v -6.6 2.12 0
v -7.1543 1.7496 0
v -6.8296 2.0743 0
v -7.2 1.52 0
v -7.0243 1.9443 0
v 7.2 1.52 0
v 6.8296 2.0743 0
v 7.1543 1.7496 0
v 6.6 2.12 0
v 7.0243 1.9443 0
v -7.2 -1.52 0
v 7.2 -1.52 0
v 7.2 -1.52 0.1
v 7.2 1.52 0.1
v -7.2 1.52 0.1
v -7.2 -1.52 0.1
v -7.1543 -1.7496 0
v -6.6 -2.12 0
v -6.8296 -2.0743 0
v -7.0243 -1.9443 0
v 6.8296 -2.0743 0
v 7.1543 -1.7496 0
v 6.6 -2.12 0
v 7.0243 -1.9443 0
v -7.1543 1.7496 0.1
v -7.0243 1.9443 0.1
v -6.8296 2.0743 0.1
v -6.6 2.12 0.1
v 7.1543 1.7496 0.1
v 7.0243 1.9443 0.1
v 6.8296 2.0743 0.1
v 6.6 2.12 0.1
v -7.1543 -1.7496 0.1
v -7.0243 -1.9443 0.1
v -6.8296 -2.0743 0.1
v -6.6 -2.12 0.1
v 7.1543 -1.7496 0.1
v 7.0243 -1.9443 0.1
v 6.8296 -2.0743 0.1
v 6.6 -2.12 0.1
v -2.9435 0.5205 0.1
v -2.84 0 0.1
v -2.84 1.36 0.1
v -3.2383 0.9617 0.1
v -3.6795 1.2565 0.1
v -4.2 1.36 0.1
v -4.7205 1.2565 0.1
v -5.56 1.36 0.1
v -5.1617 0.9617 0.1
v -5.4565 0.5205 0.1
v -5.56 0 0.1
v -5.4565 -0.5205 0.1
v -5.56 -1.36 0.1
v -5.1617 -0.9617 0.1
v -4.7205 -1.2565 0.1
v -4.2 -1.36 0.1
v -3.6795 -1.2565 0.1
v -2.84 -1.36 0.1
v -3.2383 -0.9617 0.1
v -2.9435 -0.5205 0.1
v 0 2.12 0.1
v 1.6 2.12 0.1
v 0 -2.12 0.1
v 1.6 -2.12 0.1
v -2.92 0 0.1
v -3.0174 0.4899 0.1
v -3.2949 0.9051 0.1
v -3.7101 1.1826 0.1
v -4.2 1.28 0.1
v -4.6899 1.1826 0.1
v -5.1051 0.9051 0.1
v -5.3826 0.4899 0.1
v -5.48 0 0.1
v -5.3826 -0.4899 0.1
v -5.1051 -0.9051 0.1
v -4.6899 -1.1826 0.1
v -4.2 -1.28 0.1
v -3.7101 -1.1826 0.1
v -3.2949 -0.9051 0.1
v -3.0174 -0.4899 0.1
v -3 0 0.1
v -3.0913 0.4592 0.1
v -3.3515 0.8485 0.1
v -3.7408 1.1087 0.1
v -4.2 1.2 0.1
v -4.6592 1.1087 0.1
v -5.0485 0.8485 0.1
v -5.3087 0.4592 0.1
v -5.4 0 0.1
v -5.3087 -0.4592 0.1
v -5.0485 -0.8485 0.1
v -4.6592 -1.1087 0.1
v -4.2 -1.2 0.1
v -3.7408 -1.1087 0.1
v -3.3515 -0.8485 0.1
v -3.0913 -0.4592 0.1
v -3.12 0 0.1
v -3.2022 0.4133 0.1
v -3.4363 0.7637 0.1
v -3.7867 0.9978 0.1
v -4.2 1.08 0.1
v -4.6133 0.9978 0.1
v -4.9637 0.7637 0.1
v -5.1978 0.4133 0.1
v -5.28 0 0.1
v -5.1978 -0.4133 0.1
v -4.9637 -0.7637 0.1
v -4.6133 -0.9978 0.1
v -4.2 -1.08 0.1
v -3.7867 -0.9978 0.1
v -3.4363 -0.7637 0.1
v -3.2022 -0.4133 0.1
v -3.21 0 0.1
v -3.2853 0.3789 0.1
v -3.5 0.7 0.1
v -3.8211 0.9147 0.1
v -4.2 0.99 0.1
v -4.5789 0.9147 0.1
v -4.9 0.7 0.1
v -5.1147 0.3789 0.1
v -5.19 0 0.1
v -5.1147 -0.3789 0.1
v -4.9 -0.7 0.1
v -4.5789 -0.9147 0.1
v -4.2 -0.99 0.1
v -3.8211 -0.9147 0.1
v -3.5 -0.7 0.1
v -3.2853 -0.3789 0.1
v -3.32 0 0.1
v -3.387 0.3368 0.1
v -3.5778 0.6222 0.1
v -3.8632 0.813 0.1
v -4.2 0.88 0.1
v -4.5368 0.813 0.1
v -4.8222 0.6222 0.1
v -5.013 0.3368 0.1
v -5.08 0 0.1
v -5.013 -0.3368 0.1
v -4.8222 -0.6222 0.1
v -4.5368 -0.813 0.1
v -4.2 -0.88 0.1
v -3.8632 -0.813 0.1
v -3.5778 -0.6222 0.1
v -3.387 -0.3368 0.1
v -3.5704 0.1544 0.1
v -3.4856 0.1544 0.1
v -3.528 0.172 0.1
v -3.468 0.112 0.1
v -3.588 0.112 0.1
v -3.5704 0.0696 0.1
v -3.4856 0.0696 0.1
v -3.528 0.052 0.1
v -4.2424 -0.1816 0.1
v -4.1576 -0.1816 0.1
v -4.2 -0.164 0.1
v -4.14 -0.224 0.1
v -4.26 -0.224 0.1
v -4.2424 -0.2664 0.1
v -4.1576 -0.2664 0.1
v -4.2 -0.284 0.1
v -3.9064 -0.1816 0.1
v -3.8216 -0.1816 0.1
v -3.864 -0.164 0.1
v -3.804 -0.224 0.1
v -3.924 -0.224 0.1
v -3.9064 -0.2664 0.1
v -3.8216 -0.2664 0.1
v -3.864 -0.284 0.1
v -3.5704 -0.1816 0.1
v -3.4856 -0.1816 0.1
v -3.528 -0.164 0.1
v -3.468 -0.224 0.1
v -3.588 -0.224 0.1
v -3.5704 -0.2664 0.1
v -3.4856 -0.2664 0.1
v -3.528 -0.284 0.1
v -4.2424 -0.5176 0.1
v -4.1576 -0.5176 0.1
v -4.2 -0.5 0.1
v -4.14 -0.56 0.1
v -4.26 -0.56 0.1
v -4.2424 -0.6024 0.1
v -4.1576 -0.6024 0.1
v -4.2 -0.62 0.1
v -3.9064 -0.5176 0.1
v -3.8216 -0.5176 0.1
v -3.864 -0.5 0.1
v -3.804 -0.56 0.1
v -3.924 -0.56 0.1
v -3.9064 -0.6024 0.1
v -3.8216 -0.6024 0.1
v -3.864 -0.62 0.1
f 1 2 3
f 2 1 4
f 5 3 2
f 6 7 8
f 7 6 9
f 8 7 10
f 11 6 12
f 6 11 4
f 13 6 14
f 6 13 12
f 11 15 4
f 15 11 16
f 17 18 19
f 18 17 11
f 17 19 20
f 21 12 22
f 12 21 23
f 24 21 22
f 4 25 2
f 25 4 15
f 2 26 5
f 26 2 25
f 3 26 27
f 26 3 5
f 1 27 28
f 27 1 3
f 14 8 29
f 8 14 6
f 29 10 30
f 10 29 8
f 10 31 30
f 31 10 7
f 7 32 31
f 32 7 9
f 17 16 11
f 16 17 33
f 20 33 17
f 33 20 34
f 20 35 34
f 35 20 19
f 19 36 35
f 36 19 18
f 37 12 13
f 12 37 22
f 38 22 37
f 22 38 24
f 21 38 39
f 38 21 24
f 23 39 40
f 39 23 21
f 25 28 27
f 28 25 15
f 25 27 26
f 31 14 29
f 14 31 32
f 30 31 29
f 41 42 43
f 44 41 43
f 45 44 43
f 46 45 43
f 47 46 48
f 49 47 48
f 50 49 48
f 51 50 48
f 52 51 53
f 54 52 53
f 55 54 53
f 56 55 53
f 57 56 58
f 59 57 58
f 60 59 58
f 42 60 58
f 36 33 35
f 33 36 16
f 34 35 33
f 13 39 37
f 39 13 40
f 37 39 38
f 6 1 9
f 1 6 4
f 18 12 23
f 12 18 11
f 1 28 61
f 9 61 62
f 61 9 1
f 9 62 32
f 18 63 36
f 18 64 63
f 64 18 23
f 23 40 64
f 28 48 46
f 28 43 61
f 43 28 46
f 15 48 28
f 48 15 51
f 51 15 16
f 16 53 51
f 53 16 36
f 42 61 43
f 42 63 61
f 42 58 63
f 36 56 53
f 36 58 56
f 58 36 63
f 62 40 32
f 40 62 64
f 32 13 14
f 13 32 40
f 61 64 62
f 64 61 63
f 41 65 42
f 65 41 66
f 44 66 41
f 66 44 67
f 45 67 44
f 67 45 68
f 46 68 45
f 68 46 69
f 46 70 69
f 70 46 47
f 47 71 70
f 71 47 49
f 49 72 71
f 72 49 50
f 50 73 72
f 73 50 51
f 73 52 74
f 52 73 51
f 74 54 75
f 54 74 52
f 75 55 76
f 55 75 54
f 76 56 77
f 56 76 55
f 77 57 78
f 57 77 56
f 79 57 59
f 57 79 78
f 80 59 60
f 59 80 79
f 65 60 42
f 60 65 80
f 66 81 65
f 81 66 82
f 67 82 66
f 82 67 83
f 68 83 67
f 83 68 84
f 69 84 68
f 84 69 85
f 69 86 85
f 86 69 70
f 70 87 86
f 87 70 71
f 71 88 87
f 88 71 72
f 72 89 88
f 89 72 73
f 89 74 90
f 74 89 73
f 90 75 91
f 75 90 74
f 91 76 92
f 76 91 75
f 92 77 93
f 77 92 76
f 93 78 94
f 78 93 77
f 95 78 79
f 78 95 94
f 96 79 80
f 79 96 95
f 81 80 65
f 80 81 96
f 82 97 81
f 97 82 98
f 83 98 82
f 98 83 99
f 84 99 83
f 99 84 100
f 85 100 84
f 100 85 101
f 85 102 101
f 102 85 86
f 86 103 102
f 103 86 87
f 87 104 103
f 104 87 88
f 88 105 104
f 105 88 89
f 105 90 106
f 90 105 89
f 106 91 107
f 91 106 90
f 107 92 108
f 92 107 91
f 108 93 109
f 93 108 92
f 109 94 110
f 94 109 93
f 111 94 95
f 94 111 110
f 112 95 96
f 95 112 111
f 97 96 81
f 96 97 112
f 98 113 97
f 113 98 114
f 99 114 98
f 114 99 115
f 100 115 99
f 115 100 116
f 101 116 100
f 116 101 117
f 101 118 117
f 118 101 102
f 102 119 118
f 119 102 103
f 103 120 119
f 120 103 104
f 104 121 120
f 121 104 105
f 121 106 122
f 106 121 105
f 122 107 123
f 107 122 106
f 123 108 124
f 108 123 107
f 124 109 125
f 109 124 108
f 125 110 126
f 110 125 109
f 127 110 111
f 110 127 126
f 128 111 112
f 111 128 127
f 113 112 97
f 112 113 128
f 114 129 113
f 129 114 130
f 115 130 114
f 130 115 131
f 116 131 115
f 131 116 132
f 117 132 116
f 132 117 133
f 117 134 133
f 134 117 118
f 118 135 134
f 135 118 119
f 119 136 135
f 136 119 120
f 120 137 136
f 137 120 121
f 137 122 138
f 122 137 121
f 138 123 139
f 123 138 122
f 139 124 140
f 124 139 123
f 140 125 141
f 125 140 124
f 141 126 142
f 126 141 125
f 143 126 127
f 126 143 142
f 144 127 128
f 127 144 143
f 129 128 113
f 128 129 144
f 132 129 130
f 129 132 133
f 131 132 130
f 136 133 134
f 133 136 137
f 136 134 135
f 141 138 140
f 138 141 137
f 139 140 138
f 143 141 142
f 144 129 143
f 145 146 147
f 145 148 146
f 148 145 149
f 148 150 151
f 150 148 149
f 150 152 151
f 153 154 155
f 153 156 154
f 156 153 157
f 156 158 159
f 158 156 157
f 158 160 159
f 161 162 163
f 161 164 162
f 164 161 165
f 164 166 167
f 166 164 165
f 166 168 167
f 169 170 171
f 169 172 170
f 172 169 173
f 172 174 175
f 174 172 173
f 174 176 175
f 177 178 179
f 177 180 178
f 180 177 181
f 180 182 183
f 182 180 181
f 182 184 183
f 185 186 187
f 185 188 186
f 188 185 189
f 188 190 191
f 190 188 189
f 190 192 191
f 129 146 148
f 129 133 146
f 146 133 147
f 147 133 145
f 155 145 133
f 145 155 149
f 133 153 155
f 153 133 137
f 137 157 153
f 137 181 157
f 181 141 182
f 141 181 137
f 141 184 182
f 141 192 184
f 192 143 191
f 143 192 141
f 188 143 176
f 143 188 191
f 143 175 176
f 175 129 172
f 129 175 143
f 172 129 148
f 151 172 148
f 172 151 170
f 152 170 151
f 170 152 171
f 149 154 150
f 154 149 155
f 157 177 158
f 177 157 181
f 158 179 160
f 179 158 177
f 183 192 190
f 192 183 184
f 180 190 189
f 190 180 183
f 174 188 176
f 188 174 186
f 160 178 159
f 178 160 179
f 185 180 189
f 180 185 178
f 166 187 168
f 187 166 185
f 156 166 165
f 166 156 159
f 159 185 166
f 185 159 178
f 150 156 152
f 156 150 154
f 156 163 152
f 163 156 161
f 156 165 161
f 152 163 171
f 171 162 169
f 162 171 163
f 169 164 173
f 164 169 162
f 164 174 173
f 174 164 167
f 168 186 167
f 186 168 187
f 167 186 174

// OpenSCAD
// file: ../p/4-4ring9.scad
use <../lib.scad>
function ldraw_lib__4_4ring9() = [
// 0 Ring  9 x 1.0
// 0 Name: 4-4ring9.dat
// 0 Author: John Riley [jriley]
// 0 !LDRAW_ORG Primitive UPDATE 2004-02
// 0 !LICENSE Licensed under CC BY 2.0 and CC BY 4.0 : see CAreadme.txt
// 
// 0 BFC CERTIFY CCW
  [0,"BFC","CERTIFY"],
  [0,"BFC","CCW"],
// 
// 0 !HISTORY 2004-04-22 [PTadmin] Official Update 2004-02
// 0 !HISTORY 2007-06-24 [PTadmin] Header formatted for Contributor Agreement
// 0 !HISTORY 2008-07-01 [PTadmin] Official Update 2008-01
// 
// 
// 4 16 9 0 0 10 0 0 9.239 0 3.827 8.3151 0 3.4443
  [4,16,9,0,0,10,0,0,9.239,0,3.827,8.3151,0,3.4443],
// 4 16 8.3151 0 3.4443 9.239 0 3.827 7.071 0 7.071 6.3639 0 6.3639
  [4,16,8.3151,0,3.4443,9.239,0,3.827,7.071,0,7.071,6.3639,0,6.3639],
// 4 16 6.3639 0 6.3639 7.071 0 7.071 3.827 0 9.239 3.4443 0 8.3151
  [4,16,6.3639,0,6.3639,7.071,0,7.071,3.827,0,9.239,3.4443,0,8.3151],
// 4 16 3.4443 0 8.3151 3.827 0 9.239 0 0 10 0 0 9
  [4,16,3.4443,0,8.3151,3.827,0,9.239,0,0,10,0,0,9],
// 4 16 0 0 9 0 0 10 -3.827 0 9.239 -3.4443 0 8.3151
  [4,16,0,0,9,0,0,10,-3.827,0,9.239,-3.4443,0,8.3151],
// 4 16 -3.4443 0 8.3151 -3.827 0 9.239 -7.071 0 7.071 -6.3639 0 6.3639
  [4,16,-3.4443,0,8.3151,-3.827,0,9.239,-7.071,0,7.071,-6.3639,0,6.3639],
// 4 16 -6.3639 0 6.3639 -7.071 0 7.071 -9.239 0 3.827 -8.3151 0 3.4443
  [4,16,-6.3639,0,6.3639,-7.071,0,7.071,-9.239,0,3.827,-8.3151,0,3.4443],
// 4 16 -8.3151 0 3.4443 -9.239 0 3.827 -10 0 0 -9 0 0
  [4,16,-8.3151,0,3.4443,-9.239,0,3.827,-10,0,0,-9,0,0],
// 4 16 -9 0 0 -10 0 0 -9.239 0 -3.827 -8.3151 0 -3.4443
  [4,16,-9,0,0,-10,0,0,-9.239,0,-3.827,-8.3151,0,-3.4443],
// 4 16 -8.3151 0 -3.4443 -9.239 0 -3.827 -7.071 0 -7.071 -6.3639 0 -6.3639
  [4,16,-8.3151,0,-3.4443,-9.239,0,-3.827,-7.071,0,-7.071,-6.3639,0,-6.3639],
// 4 16 -6.3639 0 -6.3639 -7.071 0 -7.071 -3.827 0 -9.239 -3.4443 0 -8.3151
  [4,16,-6.3639,0,-6.3639,-7.071,0,-7.071,-3.827,0,-9.239,-3.4443,0,-8.3151],
// 4 16 -3.4443 0 -8.3151 -3.827 0 -9.239 0 0 -10 0 0 -9
  [4,16,-3.4443,0,-8.3151,-3.827,0,-9.239,0,0,-10,0,0,-9],
// 4 16 0 0 -9 0 0 -10 3.827 0 -9.239 3.4443 0 -8.3151
  [4,16,0,0,-9,0,0,-10,3.827,0,-9.239,3.4443,0,-8.3151],
// 4 16 3.4443 0 -8.3151 3.827 0 -9.239 7.071 0 -7.071 6.3639 0 -6.3639
  [4,16,3.4443,0,-8.3151,3.827,0,-9.239,7.071,0,-7.071,6.3639,0,-6.3639],
// 4 16 6.3639 0 -6.3639 7.071 0 -7.071 9.239 0 -3.827 8.3151 0 -3.4443
  [4,16,6.3639,0,-6.3639,7.071,0,-7.071,9.239,0,-3.827,8.3151,0,-3.4443],
// 4 16 8.3151 0 -3.4443 9.239 0 -3.827 10 0 0 9 0 0
  [4,16,8.3151,0,-3.4443,9.239,0,-3.827,10,0,0,9,0,0],
// 0
];
module ldraw_lib__4_4ring9(step=0, col=false, unit=2/5, alt=false, line=0.2, solid=!$preview)
    makepoly(ldraw_lib__4_4ring9(), step=step, col=col, unit=unit, alt=alt, line=line, solid=solid);
ldraw_lib__4_4ring9(line=0.2);
// file: ../p/4-4ring8.scad
use <../lib.scad>
function ldraw_lib__4_4ring8() = [
// 0 Ring  8 x 1.0
// 0 Name: 4-4ring8.dat
// 0 Author: Steffen [Steffen]
// 0 !LDRAW_ORG Primitive UPDATE 2012-01
// 0 !LICENSE Licensed under CC BY 4.0 : see CAreadme.txt
// 
// 0 BFC CERTIFY CCW
  [0,"BFC","CERTIFY"],
  [0,"BFC","CCW"],
// 
// 0 !HISTORY 2003-12-19 [PTadmin] Official Update 2003-03
// 0 !HISTORY 2007-06-24 [PTadmin] Header formatted for Contributor Agreement
// 0 !HISTORY 2008-07-01 [PTadmin] Official Update 2008-01
// 0 !HISTORY 2012-02-16 [Philo] Changed to CCW
// 0 !HISTORY 2012-03-30 [PTadmin] Official Update 2012-01
// 
// 
// 4 16 9 0 0 8.3151 0 3.4443 7.3912 0 3.0616 8 0 0
  [4,16,9,0,0,8.3151,0,3.4443,7.3912,0,3.0616,8,0,0],
// 4 16 8.3151 0 3.4443 6.3639 0 6.3639 5.6568 0 5.6568 7.3912 0 3.0616
  [4,16,8.3151,0,3.4443,6.3639,0,6.3639,5.6568,0,5.6568,7.3912,0,3.0616],
// 4 16 6.3639 0 6.3639 3.4443 0 8.3151 3.0616 0 7.3912 5.6568 0 5.6568
  [4,16,6.3639,0,6.3639,3.4443,0,8.3151,3.0616,0,7.3912,5.6568,0,5.6568],
// 4 16 3.4443 0 8.3151 0 0 9 0 0 8 3.0616 0 7.3912
  [4,16,3.4443,0,8.3151,0,0,9,0,0,8,3.0616,0,7.3912],
// 4 16 0 0 9 -3.4443 0 8.3151 -3.0616 0 7.3912 0 0 8
  [4,16,0,0,9,-3.4443,0,8.3151,-3.0616,0,7.3912,0,0,8],
// 4 16 -3.4443 0 8.3151 -6.3639 0 6.3639 -5.6568 0 5.6568 -3.0616 0 7.3912
  [4,16,-3.4443,0,8.3151,-6.3639,0,6.3639,-5.6568,0,5.6568,-3.0616,0,7.3912],
// 4 16 -6.3639 0 6.3639 -8.3151 0 3.4443 -7.3912 0 3.0616 -5.6568 0 5.6568
  [4,16,-6.3639,0,6.3639,-8.3151,0,3.4443,-7.3912,0,3.0616,-5.6568,0,5.6568],
// 4 16 -8.3151 0 3.4443 -9 0 0 -8 0 0 -7.3912 0 3.0616
  [4,16,-8.3151,0,3.4443,-9,0,0,-8,0,0,-7.3912,0,3.0616],
// 4 16 -9 0 0 -8.3151 0 -3.4443 -7.3912 0 -3.0616 -8 0 0
  [4,16,-9,0,0,-8.3151,0,-3.4443,-7.3912,0,-3.0616,-8,0,0],
// 4 16 -8.3151 0 -3.4443 -6.3639 0 -6.3639 -5.6568 0 -5.6568 -7.3912 0 -3.0616
  [4,16,-8.3151,0,-3.4443,-6.3639,0,-6.3639,-5.6568,0,-5.6568,-7.3912,0,-3.0616],
// 4 16 -6.3639 0 -6.3639 -3.4443 0 -8.3151 -3.0616 0 -7.3912 -5.6568 0 -5.6568
  [4,16,-6.3639,0,-6.3639,-3.4443,0,-8.3151,-3.0616,0,-7.3912,-5.6568,0,-5.6568],
// 4 16 -3.4443 0 -8.3151 0 0 -9 0 0 -8 -3.0616 0 -7.3912
  [4,16,-3.4443,0,-8.3151,0,0,-9,0,0,-8,-3.0616,0,-7.3912],
// 4 16 0 0 -9 3.4443 0 -8.3151 3.0616 0 -7.3912 0 0 -8
  [4,16,0,0,-9,3.4443,0,-8.3151,3.0616,0,-7.3912,0,0,-8],
// 4 16 3.4443 0 -8.3151 6.3639 0 -6.3639 5.6568 0 -5.6568 3.0616 0 -7.3912
  [4,16,3.4443,0,-8.3151,6.3639,0,-6.3639,5.6568,0,-5.6568,3.0616,0,-7.3912],
// 4 16 6.3639 0 -6.3639 8.3151 0 -3.4443 7.3912 0 -3.0616 5.6568 0 -5.6568
  [4,16,6.3639,0,-6.3639,8.3151,0,-3.4443,7.3912,0,-3.0616,5.6568,0,-5.6568],
// 4 16 8.3151 0 -3.4443 9 0 0 8 0 0 7.3912 0 -3.0616
  [4,16,8.3151,0,-3.4443,9,0,0,8,0,0,7.3912,0,-3.0616],
];
module ldraw_lib__4_4ring8(step=0, col=false, unit=2/5, alt=false, line=0.2, solid=!$preview)
    makepoly(ldraw_lib__4_4ring8(), step=step, col=col, unit=unit, alt=alt, line=line, solid=solid);
ldraw_lib__4_4ring8(line=0.2);
// file: ../p/4-4rin16.scad
use <../lib.scad>
function ldraw_lib__4_4rin16() = [
// 0 Ring 16 x 1.0
// 0 Name: 4-4rin16.dat
// 0 Author: Guy Vivan [guyvivan]
// 0 !LDRAW_ORG Primitive UPDATE 2009-01
// 0 !LICENSE Licensed under CC BY 2.0 and CC BY 4.0 : see CAreadme.txt
// 
// 0 BFC CERTIFY CCW
  [0,"BFC","CERTIFY"],
  [0,"BFC","CCW"],
// 
// 0 !HISTORY 2009-05-02 [PTadmin] Official Update 2009-01
// 
// 
// 4 16 16 0 0 17 0 0 15.7063 0 6.5059 14.7824 0 6.1232
  [4,16,16,0,0,17,0,0,15.7063,0,6.5059,14.7824,0,6.1232],
// 4 16 14.7824 0 6.1232 15.7063 0 6.5059 12.0207 0 12.0207 11.3136 0 11.3136
  [4,16,14.7824,0,6.1232,15.7063,0,6.5059,12.0207,0,12.0207,11.3136,0,11.3136],
// 4 16 11.3136 0 11.3136 12.0207 0 12.0207 6.5059 0 15.7063 6.1232 0 14.7824
  [4,16,11.3136,0,11.3136,12.0207,0,12.0207,6.5059,0,15.7063,6.1232,0,14.7824],
// 4 16 6.1232 0 14.7824 6.5059 0 15.7063 0 0 17 0 0 16
  [4,16,6.1232,0,14.7824,6.5059,0,15.7063,0,0,17,0,0,16],
// 4 16 0 0 16 0 0 17 -6.5059 0 15.7063 -6.1232 0 14.7824
  [4,16,0,0,16,0,0,17,-6.5059,0,15.7063,-6.1232,0,14.7824],
// 4 16 -6.1232 0 14.7824 -6.5059 0 15.7063 -12.0207 0 12.0207 -11.3136 0 11.3136
  [4,16,-6.1232,0,14.7824,-6.5059,0,15.7063,-12.0207,0,12.0207,-11.3136,0,11.3136],
// 4 16 -11.3136 0 11.3136 -12.0207 0 12.0207 -15.7063 0 6.5059 -14.7824 0 6.1232
  [4,16,-11.3136,0,11.3136,-12.0207,0,12.0207,-15.7063,0,6.5059,-14.7824,0,6.1232],
// 4 16 -14.7824 0 6.1232 -15.7063 0 6.5059 -17 0 0 -16 0 0
  [4,16,-14.7824,0,6.1232,-15.7063,0,6.5059,-17,0,0,-16,0,0],
// 4 16 -16 0 0 -17 0 0 -15.7063 0 -6.5059 -14.7824 0 -6.1232
  [4,16,-16,0,0,-17,0,0,-15.7063,0,-6.5059,-14.7824,0,-6.1232],
// 4 16 -14.7824 0 -6.1232 -15.7063 0 -6.5059 -12.0207 0 -12.0207 -11.3136 0 -11.3136
  [4,16,-14.7824,0,-6.1232,-15.7063,0,-6.5059,-12.0207,0,-12.0207,-11.3136,0,-11.3136],
// 4 16 -11.3136 0 -11.3136 -12.0207 0 -12.0207 -6.5059 0 -15.7063 -6.1232 0 -14.7824
  [4,16,-11.3136,0,-11.3136,-12.0207,0,-12.0207,-6.5059,0,-15.7063,-6.1232,0,-14.7824],
// 4 16 -6.1232 0 -14.7824 -6.5059 0 -15.7063 0 0 -17 0 0 -16
  [4,16,-6.1232,0,-14.7824,-6.5059,0,-15.7063,0,0,-17,0,0,-16],
// 4 16 0 0 -16 0 0 -17 6.5059 0 -15.7063 6.1232 0 -14.7824
  [4,16,0,0,-16,0,0,-17,6.5059,0,-15.7063,6.1232,0,-14.7824],
// 4 16 6.1232 0 -14.7824 6.5059 0 -15.7063 12.0207 0 -12.0207 11.3136 0 -11.3136
  [4,16,6.1232,0,-14.7824,6.5059,0,-15.7063,12.0207,0,-12.0207,11.3136,0,-11.3136],
// 4 16 11.3136 0 -11.3136 12.0207 0 -12.0207 15.7063 0 -6.5059 14.7824 0 -6.1232
  [4,16,11.3136,0,-11.3136,12.0207,0,-12.0207,15.7063,0,-6.5059,14.7824,0,-6.1232],
// 4 16 14.7824 0 -6.1232 15.7063 0 -6.5059 17 0 0 16 0 0
  [4,16,14.7824,0,-6.1232,15.7063,0,-6.5059,17,0,0,16,0,0],
// 
// 0 end of file
// 
];
module ldraw_lib__4_4rin16(step=0, col=false, unit=2/5, alt=false, line=0.2, solid=!$preview)
    makepoly(ldraw_lib__4_4rin16(), step=step, col=col, unit=unit, alt=alt, line=line, solid=solid);
ldraw_lib__4_4rin16(line=0.2);
// file: ../p/4-4rin15.scad
use <../lib.scad>
function ldraw_lib__4_4rin15() = [
// 0 Ring 15 x 1.0
// 0 Name: 4-4rin15.dat
// 0 Author: Mark Kennedy [mkennedy]
// 0 !LDRAW_ORG Primitive UPDATE 2012-01
// 0 !LICENSE Licensed under CC BY 4.0 : see CAreadme.txt
// 
// 0 BFC CERTIFY CCW
  [0,"BFC","CERTIFY"],
  [0,"BFC","CCW"],
// 
// 0 !HISTORY 2004-04-22 [PTadmin] Official Update 2004-02
// 0 !HISTORY 2007-06-24 [PTadmin] Header formatted for Contributor Agreement
// 0 !HISTORY 2008-07-01 [PTadmin] Official Update 2008-01
// 0 !HISTORY 2012-02-16 [Philo] Changed to CCW
// 0 !HISTORY 2012-03-30 [PTadmin] Official Update 2012-01
// 
// 
// 4 16 16 0 0 14.7824 0 6.1232 13.8585 0 5.7405 15 0 0
  [4,16,16,0,0,14.7824,0,6.1232,13.8585,0,5.7405,15,0,0],
// 4 16 14.7824 0 6.1232 11.3136 0 11.3136 10.6065 0 10.6065 13.8585 0 5.7405
  [4,16,14.7824,0,6.1232,11.3136,0,11.3136,10.6065,0,10.6065,13.8585,0,5.7405],
// 4 16 11.3136 0 11.3136 6.1232 0 14.7824 5.7405 0 13.8585 10.6065 0 10.6065
  [4,16,11.3136,0,11.3136,6.1232,0,14.7824,5.7405,0,13.8585,10.6065,0,10.6065],
// 4 16 6.1232 0 14.7824 0 0 16 0 0 15 5.7405 0 13.8585
  [4,16,6.1232,0,14.7824,0,0,16,0,0,15,5.7405,0,13.8585],
// 4 16 0 0 16 -6.1232 0 14.7824 -5.7405 0 13.8585 0 0 15
  [4,16,0,0,16,-6.1232,0,14.7824,-5.7405,0,13.8585,0,0,15],
// 4 16 -6.1232 0 14.7824 -11.3136 0 11.3136 -10.6065 0 10.6065 -5.7405 0 13.8585
  [4,16,-6.1232,0,14.7824,-11.3136,0,11.3136,-10.6065,0,10.6065,-5.7405,0,13.8585],
// 4 16 -11.3136 0 11.3136 -14.7824 0 6.1232 -13.8585 0 5.7405 -10.6065 0 10.6065
  [4,16,-11.3136,0,11.3136,-14.7824,0,6.1232,-13.8585,0,5.7405,-10.6065,0,10.6065],
// 4 16 -14.7824 0 6.1232 -16 0 0 -15 0 0 -13.8585 0 5.7405
  [4,16,-14.7824,0,6.1232,-16,0,0,-15,0,0,-13.8585,0,5.7405],
// 4 16 -16 0 0 -14.7824 0 -6.1232 -13.8585 0 -5.7405 -15 0 0
  [4,16,-16,0,0,-14.7824,0,-6.1232,-13.8585,0,-5.7405,-15,0,0],
// 4 16 -14.7824 0 -6.1232 -11.3136 0 -11.3136 -10.6065 0 -10.6065 -13.8585 0 -5.7405
  [4,16,-14.7824,0,-6.1232,-11.3136,0,-11.3136,-10.6065,0,-10.6065,-13.8585,0,-5.7405],
// 4 16 -11.3136 0 -11.3136 -6.1232 0 -14.7824 -5.7405 0 -13.8585 -10.6065 0 -10.6065
  [4,16,-11.3136,0,-11.3136,-6.1232,0,-14.7824,-5.7405,0,-13.8585,-10.6065,0,-10.6065],
// 4 16 -6.1232 0 -14.7824 0 0 -16 0 0 -15 -5.7405 0 -13.8585
  [4,16,-6.1232,0,-14.7824,0,0,-16,0,0,-15,-5.7405,0,-13.8585],
// 4 16 0 0 -16 6.1232 0 -14.7824 5.7405 0 -13.8585 0 0 -15
  [4,16,0,0,-16,6.1232,0,-14.7824,5.7405,0,-13.8585,0,0,-15],
// 4 16 6.1232 0 -14.7824 11.3136 0 -11.3136 10.6065 0 -10.6065 5.7405 0 -13.8585
  [4,16,6.1232,0,-14.7824,11.3136,0,-11.3136,10.6065,0,-10.6065,5.7405,0,-13.8585],
// 4 16 11.3136 0 -11.3136 14.7824 0 -6.1232 13.8585 0 -5.7405 10.6065 0 -10.6065
  [4,16,11.3136,0,-11.3136,14.7824,0,-6.1232,13.8585,0,-5.7405,10.6065,0,-10.6065],
// 4 16 14.7824 0 -6.1232 16 0 0 15 0 0 13.8585 0 -5.7405
  [4,16,14.7824,0,-6.1232,16,0,0,15,0,0,13.8585,0,-5.7405],
];
module ldraw_lib__4_4rin15(step=0, col=false, unit=2/5, alt=false, line=0.2, solid=!$preview)
    makepoly(ldraw_lib__4_4rin15(), step=step, col=col, unit=unit, alt=alt, line=line, solid=solid);
ldraw_lib__4_4rin15(line=0.2);
// file: ../p/4-4rin11.scad
use <../lib.scad>
function ldraw_lib__4_4rin11() = [
// 0 Ring 11 x 1.0
// 0 Name: 4-4rin11.dat
// 0 Author: John Riley [jriley]
// 0 !LDRAW_ORG Primitive UPDATE 2003-03
// 0 !LICENSE Licensed under CC BY 2.0 and CC BY 4.0 : see CAreadme.txt
// 
// 0 BFC CERTIFY CCW
  [0,"BFC","CERTIFY"],
  [0,"BFC","CCW"],
// 
// 0 !HISTORY 2003-12-19 [PTadmin] Official Update 2003-03
// 0 !HISTORY 2007-06-24 [PTadmin] Header formatted for Contributor Agreement
// 0 !HISTORY 2008-07-01 [PTadmin] Official Update 2008-01
// 
// 
// 4 16 11 0 0 12 0 0 11.0868 0 4.5924 10.1629 0 4.2097
  [4,16,11,0,0,12,0,0,11.0868,0,4.5924,10.1629,0,4.2097],
// 4 16 10.1629 0 4.2097 11.0868 0 4.5924 8.4852 0 8.4852 7.7781 0 7.7781
  [4,16,10.1629,0,4.2097,11.0868,0,4.5924,8.4852,0,8.4852,7.7781,0,7.7781],
// 4 16 7.7781 0 7.7781 8.4852 0 8.4852 4.5924 0 11.0868 4.2097 0 10.1629
  [4,16,7.7781,0,7.7781,8.4852,0,8.4852,4.5924,0,11.0868,4.2097,0,10.1629],
// 4 16 4.2097 0 10.1629 4.5924 0 11.0868 0 0 12 0 0 11
  [4,16,4.2097,0,10.1629,4.5924,0,11.0868,0,0,12,0,0,11],
// 4 16 0 0 11 0 0 12 -4.5924 0 11.0868 -4.2097 0 10.1629
  [4,16,0,0,11,0,0,12,-4.5924,0,11.0868,-4.2097,0,10.1629],
// 4 16 -4.2097 0 10.1629 -4.5924 0 11.0868 -8.4852 0 8.4852 -7.7781 0 7.7781
  [4,16,-4.2097,0,10.1629,-4.5924,0,11.0868,-8.4852,0,8.4852,-7.7781,0,7.7781],
// 4 16 -7.7781 0 7.7781 -8.4852 0 8.4852 -11.0868 0 4.5924 -10.1629 0 4.2097
  [4,16,-7.7781,0,7.7781,-8.4852,0,8.4852,-11.0868,0,4.5924,-10.1629,0,4.2097],
// 4 16 -10.1629 0 4.2097 -11.0868 0 4.5924 -12 0 0 -11 0 0
  [4,16,-10.1629,0,4.2097,-11.0868,0,4.5924,-12,0,0,-11,0,0],
// 4 16 -11 0 0 -12 0 0 -11.0868 0 -4.5924 -10.1629 0 -4.2097
  [4,16,-11,0,0,-12,0,0,-11.0868,0,-4.5924,-10.1629,0,-4.2097],
// 4 16 -10.1629 0 -4.2097 -11.0868 0 -4.5924 -8.4852 0 -8.4852 -7.7781 0 -7.7781
  [4,16,-10.1629,0,-4.2097,-11.0868,0,-4.5924,-8.4852,0,-8.4852,-7.7781,0,-7.7781],
// 4 16 -7.7781 0 -7.7781 -8.4852 0 -8.4852 -4.5924 0 -11.0868 -4.2097 0 -10.1629
  [4,16,-7.7781,0,-7.7781,-8.4852,0,-8.4852,-4.5924,0,-11.0868,-4.2097,0,-10.1629],
// 4 16 -4.2097 0 -10.1629 -4.5924 0 -11.0868 0 0 -12 0 0 -11
  [4,16,-4.2097,0,-10.1629,-4.5924,0,-11.0868,0,0,-12,0,0,-11],
// 4 16 0 0 -11 0 0 -12 4.5924 0 -11.0868 4.2097 0 -10.1629
  [4,16,0,0,-11,0,0,-12,4.5924,0,-11.0868,4.2097,0,-10.1629],
// 4 16 4.2097 0 -10.1629 4.5924 0 -11.0868 8.4852 0 -8.4852 7.7781 0 -7.7781
  [4,16,4.2097,0,-10.1629,4.5924,0,-11.0868,8.4852,0,-8.4852,7.7781,0,-7.7781],
// 4 16 7.7781 0 -7.7781 8.4852 0 -8.4852 11.0868 0 -4.5924 10.1629 0 -4.2097
  [4,16,7.7781,0,-7.7781,8.4852,0,-8.4852,11.0868,0,-4.5924,10.1629,0,-4.2097],
// 4 16 10.1629 0 -4.2097 11.0868 0 -4.5924 12 0 0 11 0 0
  [4,16,10.1629,0,-4.2097,11.0868,0,-4.5924,12,0,0,11,0,0],
// 0
];
module ldraw_lib__4_4rin11(step=0, col=false, unit=2/5, alt=false, line=0.2, solid=!$preview)
    makepoly(ldraw_lib__4_4rin11(), step=step, col=col, unit=unit, alt=alt, line=line, solid=solid);
ldraw_lib__4_4rin11(line=0.2);
// file: ../p/1-8chrd.scad
use <../lib.scad>
function ldraw_lib__1_8chrd() = [
// 0 Chord 0.125
// 0 Name: 1-8chrd.dat
// 0 Author: Andy Westrate [westrate]
// 0 !LDRAW_ORG Primitive UPDATE 2004-02
// 0 !LICENSE Licensed under CC BY 2.0 and CC BY 4.0 : see CAreadme.txt
// 
// 0 BFC CERTIFY CCW
  [0,"BFC","CERTIFY"],
  [0,"BFC","CCW"],
// 
// 0 !HISTORY 2004-04-22 [PTadmin] Official Update 2004-02
// 0 !HISTORY 2007-06-22 [PTadmin] Header formatted for Contributor Agreement
// 0 !HISTORY 2008-07-01 [PTadmin] Official Update 2008-01
// 
// 
// 3 16 0.7071 0 0.7071 1 0 0 0.9239 0 0.3827
  [3,16,0.7071,0,0.7071,1,0,0,0.9239,0,0.3827],
// 
// 0
];
module ldraw_lib__1_8chrd(step=0, col=false, unit=2/5, alt=false, line=0.2, solid=!$preview)
    makepoly(ldraw_lib__1_8chrd(), step=step, col=col, unit=unit, alt=alt, line=line, solid=solid);
ldraw_lib__1_8chrd(line=0.2);
// file: ../p/box3u12.scad
use <../lib.scad>
function ldraw_lib__box3u12() = [
// 0 Box with 3 Parallel Faces without Any Edges
// 0 Name: box3u12.dat
// 0 Author: J.C. Tchang [tchang]
// 0 !LDRAW_ORG Primitive UPDATE 2014-02
// 0 !LICENSE Licensed under CC BY 4.0 : see CAreadme.txt
// 
// 0 BFC CERTIFY CCW
  [0,"BFC","CERTIFY"],
  [0,"BFC","CCW"],
// 
// 0 !HISTORY 2014-12-23 [PTadmin] Official Update 2014-02
// 
// 
// 4 16 -1 1 1 1 1 1 1 1 -1 -1 1 -1
  [4,16,-1,1,1,1,1,1,1,1,-1,-1,1,-1],
// 4 16 -1 1 1 -1 0 1 1 0 1 1 1 1
  [4,16,-1,1,1,-1,0,1,1,0,1,1,1,1],
// 4 16 1 1 -1 1 0 -1 -1 0 -1 -1 1 -1
  [4,16,1,1,-1,1,0,-1,-1,0,-1,-1,1,-1],
];
module ldraw_lib__box3u12(step=0, col=false, unit=2/5, alt=false, line=0.2, solid=!$preview)
    makepoly(ldraw_lib__box3u12(), step=step, col=col, unit=unit, alt=alt, line=line, solid=solid);
ldraw_lib__box3u12(line=0.2);
// file: ../p/4-4ndis.scad
use <../lib.scad>
function ldraw_lib__4_4ndis() = [
// 0 Disc Negative 1.0
// 0 Name: 4-4ndis.dat
// 0 Author: James Jessiman
// 0 !LDRAW_ORG Primitive UPDATE 2012-01
// 0 !LICENSE Licensed under CC BY 4.0 : see CAreadme.txt
// 
// 0 BFC CERTIFY CCW
  [0,"BFC","CERTIFY"],
  [0,"BFC","CCW"],
// 
// 0 !HISTORY 2002-03-23 [sbliss] Added BFC statement; compacted code
// 0 !HISTORY 2002-04-25 [PTadmin] Official Update 2002-02
// 0 !HISTORY 2007-06-24 [PTadmin] Header formatted for Contributor Agreement
// 0 !HISTORY 2008-07-01 [PTadmin] Official Update 2008-01
// 0 !HISTORY 2012-02-16 [Philo] Changed to CCW
// 0 !HISTORY 2012-03-30 [PTadmin] Official Update 2012-01
// 
// 
// 3 16 0.9239 0 0.3827 1 0 0 1 0 1
  [3,16,0.9239,0,0.3827,1,0,0,1,0,1],
// 3 16 0.7071 0 0.7071 0.9239 0 0.3827 1 0 1
  [3,16,0.7071,0,0.7071,0.9239,0,0.3827,1,0,1],
// 3 16 0.3827 0 0.9239 0.7071 0 0.7071 1 0 1
  [3,16,0.3827,0,0.9239,0.7071,0,0.7071,1,0,1],
// 3 16 0 0 1 0.3827 0 0.9239 1 0 1
  [3,16,0,0,1,0.3827,0,0.9239,1,0,1],
// 3 16 -0.3827 0 0.9239 0 0 1 -1 0 1
  [3,16,-0.3827,0,0.9239,0,0,1,-1,0,1],
// 3 16 -0.7071 0 0.7071 -0.3827 0 0.9239 -1 0 1
  [3,16,-0.7071,0,0.7071,-0.3827,0,0.9239,-1,0,1],
// 3 16 -0.9239 0 0.3827 -0.7071 0 0.7071 -1 0 1
  [3,16,-0.9239,0,0.3827,-0.7071,0,0.7071,-1,0,1],
// 3 16 -1 0 0 -0.9239 0 0.3827 -1 0 1
  [3,16,-1,0,0,-0.9239,0,0.3827,-1,0,1],
// 3 16 -0.9239 0 -0.3827 -1 0 0 -1 0 -1
  [3,16,-0.9239,0,-0.3827,-1,0,0,-1,0,-1],
// 3 16 -0.7071 0 -0.7071 -0.9239 0 -0.3827 -1 0 -1
  [3,16,-0.7071,0,-0.7071,-0.9239,0,-0.3827,-1,0,-1],
// 3 16 -0.3827 0 -0.9239 -0.7071 0 -0.7071 -1 0 -1
  [3,16,-0.3827,0,-0.9239,-0.7071,0,-0.7071,-1,0,-1],
// 3 16 0 0 -1 -0.3827 0 -0.9239 -1 0 -1
  [3,16,0,0,-1,-0.3827,0,-0.9239,-1,0,-1],
// 3 16 0.3827 0 -0.9239 0 0 -1 1 0 -1
  [3,16,0.3827,0,-0.9239,0,0,-1,1,0,-1],
// 3 16 0.7071 0 -0.7071 0.3827 0 -0.9239 1 0 -1
  [3,16,0.7071,0,-0.7071,0.3827,0,-0.9239,1,0,-1],
// 3 16 0.9239 0 -0.3827 0.7071 0 -0.7071 1 0 -1
  [3,16,0.9239,0,-0.3827,0.7071,0,-0.7071,1,0,-1],
// 3 16 1 0 0 0.9239 0 -0.3827 1 0 -1
  [3,16,1,0,0,0.9239,0,-0.3827,1,0,-1],
];
module ldraw_lib__4_4ndis(step=0, col=false, unit=2/5, alt=false, line=0.2, solid=!$preview)
    makepoly(ldraw_lib__4_4ndis(), step=step, col=col, unit=unit, alt=alt, line=line, solid=solid);
ldraw_lib__4_4ndis(line=0.2);
// file: ../p/1-4cyli.scad
use <../lib.scad>
function ldraw_lib__1_4cyli() = [
// 0 Cylinder 0.25
// 0 Name: 1-4cyli.dat
// 0 Author: James Jessiman
// 0 !LDRAW_ORG Primitive UPDATE 2012-01
// 0 !LICENSE Licensed under CC BY 4.0 : see CAreadme.txt
// 
// 0 BFC CERTIFY CCW
  [0,"BFC","CERTIFY"],
  [0,"BFC","CCW"],
// 
// 0 !HISTORY 2002-03-23 [sbliss] Added BFC statement.
// 0 !HISTORY 2002-04-25 [PTadmin] Official Update 2002-02
// 0 !HISTORY 2007-06-22 [PTadmin] Header formatted for Contributor Agreement
// 0 !HISTORY 2008-07-01 [PTadmin] Official Update 2008-01
// 0 !HISTORY 2012-02-16 [Philo] Changed to CCW
// 0 !HISTORY 2012-03-30 [PTadmin] Official Update 2012-01
// 
// 
// 4 16 1 1 0 0.9239 1 0.3827 0.9239 0 0.3827 1 0 0
  [4,16,1,1,0,0.9239,1,0.3827,0.9239,0,0.3827,1,0,0],
// 5 24 1 0 0 1 1 0 0.9239 0 0.3827 1 0 -1
  [5,24,1,0,0,1,1,0,0.9239,0,0.3827,1,0,-1],
// 4 16 0.9239 1 0.3827 0.7071 1 0.7071 0.7071 0 0.7071 0.9239 0 0.3827
  [4,16,0.9239,1,0.3827,0.7071,1,0.7071,0.7071,0,0.7071,0.9239,0,0.3827],
// 5 24 0.9239 0 0.3827 0.9239 1 0.3827 0.7071 0 0.7071 1 0 0
  [5,24,0.9239,0,0.3827,0.9239,1,0.3827,0.7071,0,0.7071,1,0,0],
// 4 16 0.7071 1 0.7071 0.3827 1 0.9239 0.3827 0 0.9239 0.7071 0 0.7071
  [4,16,0.7071,1,0.7071,0.3827,1,0.9239,0.3827,0,0.9239,0.7071,0,0.7071],
// 5 24 0.7071 0 0.7071 0.7071 1 0.7071 0.3827 0 0.9239 0.9239 0 0.3827
  [5,24,0.7071,0,0.7071,0.7071,1,0.7071,0.3827,0,0.9239,0.9239,0,0.3827],
// 4 16 0.3827 1 0.9239 0 1 1 0 0 1 0.3827 0 0.9239
  [4,16,0.3827,1,0.9239,0,1,1,0,0,1,0.3827,0,0.9239],
// 5 24 0.3827 0 0.9239 0.3827 1 0.9239 0 0 1 0.7071 0 0.7071
  [5,24,0.3827,0,0.9239,0.3827,1,0.9239,0,0,1,0.7071,0,0.7071],
// 5 24 0 0 1 0 1 1 0.3827 0 0.9239 -1 0 1
  [5,24,0,0,1,0,1,1,0.3827,0,0.9239,-1,0,1],
];
module ldraw_lib__1_4cyli(step=0, col=false, unit=2/5, alt=false, line=0.2, solid=!$preview)
    makepoly(ldraw_lib__1_4cyli(), step=step, col=col, unit=unit, alt=alt, line=line, solid=solid);
ldraw_lib__1_4cyli(line=0.2);
// file: ../p/1-4chrd.scad
use <../lib.scad>
function ldraw_lib__1_4chrd() = [
// 0 Chord 0.25
// 0 Name: 1-4chrd.dat
// 0 Author: Tony Hafner [hafhead]
// 0 !LDRAW_ORG Primitive UPDATE 2012-02
// 0 !LICENSE Licensed under CC BY 2.0 and CC BY 4.0 : see CAreadme.txt
// 
// 0 BFC CERTIFY CCW
  [0,"BFC","CERTIFY"],
  [0,"BFC","CCW"],
// 
// 0 !HISTORY 2004-04-22 [PTadmin] Official Update 2004-02
// 0 !HISTORY 2007-10-09 [PTadmin] Header formatted for Contributor Agreement
// 0 !HISTORY 2008-07-01 [PTadmin] Official Update 2008-01
// 0 !HISTORY 2012-08-02 [MMR1988] Re-creation with PrimGen2 and Rectifier
// 0 !HISTORY 2012-08-09 [PTadmin] Official Update 2012-02
// 
// 
// 4 16 0.9239 0 0.3827 0.3827 0 0.9239 0 0 1 1 0 0
  [4,16,0.9239,0,0.3827,0.3827,0,0.9239,0,0,1,1,0,0],
// 3 16 0.7071 0 0.7071 0.3827 0 0.9239 0.9239 0 0.3827
  [3,16,0.7071,0,0.7071,0.3827,0,0.9239,0.9239,0,0.3827],
];
module ldraw_lib__1_4chrd(step=0, col=false, unit=2/5, alt=false, line=0.2, solid=!$preview)
    makepoly(ldraw_lib__1_4chrd(), step=step, col=col, unit=unit, alt=alt, line=line, solid=solid);
ldraw_lib__1_4chrd(line=0.2);
// file: s/6142617ls01.scad
use <../../lib.scad>
use <../../p/1-4chrd.scad>
use <../../p/1-4cyli.scad>
use <../../p/4-4ndis.scad>
use <../../p/box3u12.scad>
function ldraw_lib__s__6142617ls01() = [
// 0 ~Sticker  0.5 x  1.8 with Fog Light and Silver Stripe on Black Background Left - Common Part
// 0 Name: s\6142617ls01.dat
// 0 Author: Massimo Maso [Sirio]
// 0 !LDRAW_ORG Subpart UPDATE 2023-04
// 0 !LICENSE Licensed under CC BY 4.0 : see CAreadme.txt
// 
// 0 BFC CERTIFY CCW
  [0,"BFC","CERTIFY"],
  [0,"BFC","CCW"],
// 
// 0 !HISTORY 2022-07-18 [PTadmin] Official Update 2022-04
// 0 !HISTORY 2022-07-22 [Sirio] Reduced diameter of fog light; changed color of stripe
// 0 !HISTORY 2023-08-25 [OrionP] Official Update 2023-04
// 
// 
// 0 // Primitives
// 1 16 -16.5 0 3.8 -1.5 0 0 0 -1 0 0 0 1.5 1-4chrd.dat
  [1,16,-16.5,0,3.8,-1.5,0,0,0,-1,0,0,0,1.5, ldraw_lib__1_4chrd()],
// 1 16 16.5 0 3.8 1.5 0 0 0 -1 0 0 0 1.5 1-4chrd.dat
  [1,16,16.5,0,3.8,1.5,0,0,0,-1,0,0,0,1.5, ldraw_lib__1_4chrd()],
// 1 16 0 -.25 0 0 0 18 0 .25 0 3.8 0 0 box3u12.dat
  [1,16,0,-.25,0,0,0,18,0,.25,0,3.8,0,0, ldraw_lib__box3u12()],
// 1 16 -16.5 0 -3.8 -1.5 0 0 0 -1 0 0 0 -1.5 1-4chrd.dat
  [1,16,-16.5,0,-3.8,-1.5,0,0,0,-1,0,0,0,-1.5, ldraw_lib__1_4chrd()],
// 1 16 16.5 0 -3.8 1.5 0 0 0 -1 0 0 0 -1.5 1-4chrd.dat
  [1,16,16.5,0,-3.8,1.5,0,0,0,-1,0,0,0,-1.5, ldraw_lib__1_4chrd()],
// 1 16 -16.5 0 3.8 -1.5 0 0 0 -.25 0 0 0 1.5 1-4cyli.dat
  [1,16,-16.5,0,3.8,-1.5,0,0,0,-.25,0,0,0,1.5, ldraw_lib__1_4cyli()],
// 1 16 16.5 0 3.8 1.5 0 0 0 -.25 0 0 0 1.5 1-4cyli.dat
  [1,16,16.5,0,3.8,1.5,0,0,0,-.25,0,0,0,1.5, ldraw_lib__1_4cyli()],
// 1 16 -16.5 0 -3.8 -1.5 0 0 0 -.25 0 0 0 -1.5 1-4cyli.dat
  [1,16,-16.5,0,-3.8,-1.5,0,0,0,-.25,0,0,0,-1.5, ldraw_lib__1_4cyli()],
// 1 16 16.5 0 -3.8 1.5 0 0 0 -.25 0 0 0 -1.5 1-4cyli.dat
  [1,16,16.5,0,-3.8,1.5,0,0,0,-.25,0,0,0,-1.5, ldraw_lib__1_4cyli()],
// 1 0 -16.5 -.25 3.8 -1.5 0 0 0 1 0 0 0 1.5 1-4chrd.dat
  [1,0,-16.5,-.25,3.8,-1.5,0,0,0,1,0,0,0,1.5, ldraw_lib__1_4chrd()],
// 1 0 16.5 -.25 3.8 1.5 0 0 0 1 0 0 0 1.5 1-4chrd.dat
  [1,0,16.5,-.25,3.8,1.5,0,0,0,1,0,0,0,1.5, ldraw_lib__1_4chrd()],
// 1 0 -10.5 -.25 0 3.4 0 0 0 1 0 0 0 3.4 4-4ndis.dat
  [1,0,-10.5,-.25,0,3.4,0,0,0,1,0,0,0,3.4, ldraw_lib__4_4ndis()],
// 1 0 -16.5 -.25 -3.8 -1.5 0 0 0 1 0 0 0 -1.5 1-4chrd.dat
  [1,0,-16.5,-.25,-3.8,-1.5,0,0,0,1,0,0,0,-1.5, ldraw_lib__1_4chrd()],
// 1 0 16.5 -.25 -3.8 1.5 0 0 0 1 0 0 0 -1.5 1-4chrd.dat
  [1,0,16.5,-.25,-3.8,1.5,0,0,0,1,0,0,0,-1.5, ldraw_lib__1_4chrd()],
// 0 // Bottom face
// 4 16 16.5 0 5.3 18 0 3.8 -18 0 3.8 -16.5 0 5.3
  [4,16,16.5,0,5.3,18,0,3.8,-18,0,3.8,-16.5,0,5.3],
// 4 16 16.5 0 -5.3 -16.5 0 -5.3 -18 0 -3.8 18 0 -3.8
  [4,16,16.5,0,-5.3,-16.5,0,-5.3,-18,0,-3.8,18,0,-3.8],
// 0 // Lateral face
// 3 16 -16.5 0 5.3 -16.5 -.25 5.3 0 -.25 5.3
  [3,16,-16.5,0,5.3,-16.5,-.25,5.3,0,-.25,5.3],
// 4 16 -16.5 0 5.3 0 -.25 5.3 4 -.25 5.3 16.5 0 5.3
  [4,16,-16.5,0,5.3,0,-.25,5.3,4,-.25,5.3,16.5,0,5.3],
// 3 16 16.5 0 5.3 4 -.25 5.3 16.5 -.25 5.3
  [3,16,16.5,0,5.3,4,-.25,5.3,16.5,-.25,5.3],
// 3 16 -16.5 0 -5.3 0 -.25 -5.3 -16.5 -.25 -5.3
  [3,16,-16.5,0,-5.3,0,-.25,-5.3,-16.5,-.25,-5.3],
// 4 16 -16.5 0 -5.3 16.5 0 -5.3 4 -.25 -5.3 0 -.25 -5.3
  [4,16,-16.5,0,-5.3,16.5,0,-5.3,4,-.25,-5.3,0,-.25,-5.3],
// 3 16 16.5 0 -5.3 16.5 -.25 -5.3 4 -.25 -5.3
  [3,16,16.5,0,-5.3,16.5,-.25,-5.3,4,-.25,-5.3],
// 0 // Top face
// 0 // Black faces
// 3 0 -16.5 -.25 5.3 -13.9 -.25 3.4 -10.5 -.25 3.4
  [3,0,-16.5,-.25,5.3,-13.9,-.25,3.4,-10.5,-.25,3.4],
// 4 0 -16.5 -.25 5.3 -10.5 -.25 3.4 -7.1 -.25 3.4 0 -.25 5.3
  [4,0,-16.5,-.25,5.3,-10.5,-.25,3.4,-7.1,-.25,3.4,0,-.25,5.3],
// 4 0 -13.9 -.25 0 -13.9 -.25 3.4 -16.5 -.25 5.3 -18 -.25 3.8
  [4,0,-13.9,-.25,0,-13.9,-.25,3.4,-16.5,-.25,5.3,-18,-.25,3.8],
// 3 0 -13.9 -.25 0 -18 -.25 3.8 -18 -.25 -3.8
  [3,0,-13.9,-.25,0,-18,-.25,3.8,-18,-.25,-3.8],
// 4 0 -13.9 -.25 0 -18 -.25 -3.8 -16.5 -.25 -5.3 -13.9 -.25 -3.4
  [4,0,-13.9,-.25,0,-18,-.25,-3.8,-16.5,-.25,-5.3,-13.9,-.25,-3.4],
// 3 0 -7.1 -.25 0 0 -.25 5.3 -7.1 -.25 3.4
  [3,0,-7.1,-.25,0,0,-.25,5.3,-7.1,-.25,3.4],
// 3 0 -7.1 -.25 0 0 -.25 -5.3 0 -.25 5.3
  [3,0,-7.1,-.25,0,0,-.25,-5.3,0,-.25,5.3],
// 3 0 -7.1 -.25 0 -7.1 -.25 -3.4 0 -.25 -5.3
  [3,0,-7.1,-.25,0,-7.1,-.25,-3.4,0,-.25,-5.3],
// 3 0 -16.5 -.25 -5.3 -10.5 -.25 -3.4 -13.9 -.25 -3.4
  [3,0,-16.5,-.25,-5.3,-10.5,-.25,-3.4,-13.9,-.25,-3.4],
// 4 0 -16.5 -.25 -5.3 0 -.25 -5.3 -7.1 -.25 -3.4 -10.5 -.25 -3.4
  [4,0,-16.5,-.25,-5.3,0,-.25,-5.3,-7.1,-.25,-3.4,-10.5,-.25,-3.4],
// 4 0 16.5 -.25 5.3 4 -.25 5.3 4 -.25 -5.3 16.5 -.25 -5.3
  [4,0,16.5,-.25,5.3,4,-.25,5.3,4,-.25,-5.3,16.5,-.25,-5.3],
// 4 0 16.5 -.25 5.3 16.5 -.25 -5.3 18 -.25 -3.8 18 -.25 3.8
  [4,0,16.5,-.25,5.3,16.5,-.25,-5.3,18,-.25,-3.8,18,-.25,3.8],
// 0 // Silver face
// 4 80 0 -.25 5.3 0 -.25 -5.3 4 -.25 -5.3 4 -.25 5.3
  [4,80,0,-.25,5.3,0,-.25,-5.3,4,-.25,-5.3,4,-.25,5.3],
];
module ldraw_lib__s__6142617ls01(step=0, col=false, unit=2/5, alt=false, line=0.2, solid=!$preview)
    makepoly(ldraw_lib__s__6142617ls01(), step=step, col=col, unit=unit, alt=alt, line=line, solid=solid);
ldraw_lib__s__6142617ls01(line=0.2);
// main file
use <../lib.scad>
use <s/6142617ls01.scad>
use <s/6142617ls02.scad>
function ldraw_lib__6142617l() = [
// 0 Sticker  0.5 x  1.8 with Fog Light and Silver Stripe on Black Background Left
// 0 Name: 6142617l.dat
// 0 Author: Massimo Maso [Sirio]
// 0 !LDRAW_ORG Part UPDATE 2023-04
// 0 !LICENSE Licensed under CC BY 4.0 : see CAreadme.txt
// 
// 0 BFC CERTIFY CCW
  [0,"BFC","CERTIFY"],
  [0,"BFC","CCW"],
// 
// 0 !KEYWORDS 1969, Camaro, Chevrolet, Drag, Race, Set 75874, Speed Champions
// 0 !KEYWORDS Z/28
// 
// 0 !HISTORY 2023-08-25 [OrionP] Official Update 2023-04
// 
// 
// 0 // Subparts
// 
// 1 16 0 0 0 1 0 0 0 1 0 0 0 1 s\6142617ls01.dat
  [1,16,0,0,0,1,0,0,0,1,0,0,0,1, ldraw_lib__s__6142617ls01()],
// 1 16 -10.5 -.25 0 1 0 0 0 1 0 0 0 1 s\6142617ls02.dat
  [1,16,-10.5,-.25,0,1,0,0,0,1,0,0,0,1, ldraw_lib__s__6142617ls02()],
];
module ldraw_lib__6142617l(step=0, col=false, unit=2/5, alt=false, line=0.2, solid=!$preview)
    makepoly(ldraw_lib__6142617l(), step=step, col=col, unit=unit, alt=alt, line=line, solid=solid);
ldraw_lib__6142617l(line=0.2);
